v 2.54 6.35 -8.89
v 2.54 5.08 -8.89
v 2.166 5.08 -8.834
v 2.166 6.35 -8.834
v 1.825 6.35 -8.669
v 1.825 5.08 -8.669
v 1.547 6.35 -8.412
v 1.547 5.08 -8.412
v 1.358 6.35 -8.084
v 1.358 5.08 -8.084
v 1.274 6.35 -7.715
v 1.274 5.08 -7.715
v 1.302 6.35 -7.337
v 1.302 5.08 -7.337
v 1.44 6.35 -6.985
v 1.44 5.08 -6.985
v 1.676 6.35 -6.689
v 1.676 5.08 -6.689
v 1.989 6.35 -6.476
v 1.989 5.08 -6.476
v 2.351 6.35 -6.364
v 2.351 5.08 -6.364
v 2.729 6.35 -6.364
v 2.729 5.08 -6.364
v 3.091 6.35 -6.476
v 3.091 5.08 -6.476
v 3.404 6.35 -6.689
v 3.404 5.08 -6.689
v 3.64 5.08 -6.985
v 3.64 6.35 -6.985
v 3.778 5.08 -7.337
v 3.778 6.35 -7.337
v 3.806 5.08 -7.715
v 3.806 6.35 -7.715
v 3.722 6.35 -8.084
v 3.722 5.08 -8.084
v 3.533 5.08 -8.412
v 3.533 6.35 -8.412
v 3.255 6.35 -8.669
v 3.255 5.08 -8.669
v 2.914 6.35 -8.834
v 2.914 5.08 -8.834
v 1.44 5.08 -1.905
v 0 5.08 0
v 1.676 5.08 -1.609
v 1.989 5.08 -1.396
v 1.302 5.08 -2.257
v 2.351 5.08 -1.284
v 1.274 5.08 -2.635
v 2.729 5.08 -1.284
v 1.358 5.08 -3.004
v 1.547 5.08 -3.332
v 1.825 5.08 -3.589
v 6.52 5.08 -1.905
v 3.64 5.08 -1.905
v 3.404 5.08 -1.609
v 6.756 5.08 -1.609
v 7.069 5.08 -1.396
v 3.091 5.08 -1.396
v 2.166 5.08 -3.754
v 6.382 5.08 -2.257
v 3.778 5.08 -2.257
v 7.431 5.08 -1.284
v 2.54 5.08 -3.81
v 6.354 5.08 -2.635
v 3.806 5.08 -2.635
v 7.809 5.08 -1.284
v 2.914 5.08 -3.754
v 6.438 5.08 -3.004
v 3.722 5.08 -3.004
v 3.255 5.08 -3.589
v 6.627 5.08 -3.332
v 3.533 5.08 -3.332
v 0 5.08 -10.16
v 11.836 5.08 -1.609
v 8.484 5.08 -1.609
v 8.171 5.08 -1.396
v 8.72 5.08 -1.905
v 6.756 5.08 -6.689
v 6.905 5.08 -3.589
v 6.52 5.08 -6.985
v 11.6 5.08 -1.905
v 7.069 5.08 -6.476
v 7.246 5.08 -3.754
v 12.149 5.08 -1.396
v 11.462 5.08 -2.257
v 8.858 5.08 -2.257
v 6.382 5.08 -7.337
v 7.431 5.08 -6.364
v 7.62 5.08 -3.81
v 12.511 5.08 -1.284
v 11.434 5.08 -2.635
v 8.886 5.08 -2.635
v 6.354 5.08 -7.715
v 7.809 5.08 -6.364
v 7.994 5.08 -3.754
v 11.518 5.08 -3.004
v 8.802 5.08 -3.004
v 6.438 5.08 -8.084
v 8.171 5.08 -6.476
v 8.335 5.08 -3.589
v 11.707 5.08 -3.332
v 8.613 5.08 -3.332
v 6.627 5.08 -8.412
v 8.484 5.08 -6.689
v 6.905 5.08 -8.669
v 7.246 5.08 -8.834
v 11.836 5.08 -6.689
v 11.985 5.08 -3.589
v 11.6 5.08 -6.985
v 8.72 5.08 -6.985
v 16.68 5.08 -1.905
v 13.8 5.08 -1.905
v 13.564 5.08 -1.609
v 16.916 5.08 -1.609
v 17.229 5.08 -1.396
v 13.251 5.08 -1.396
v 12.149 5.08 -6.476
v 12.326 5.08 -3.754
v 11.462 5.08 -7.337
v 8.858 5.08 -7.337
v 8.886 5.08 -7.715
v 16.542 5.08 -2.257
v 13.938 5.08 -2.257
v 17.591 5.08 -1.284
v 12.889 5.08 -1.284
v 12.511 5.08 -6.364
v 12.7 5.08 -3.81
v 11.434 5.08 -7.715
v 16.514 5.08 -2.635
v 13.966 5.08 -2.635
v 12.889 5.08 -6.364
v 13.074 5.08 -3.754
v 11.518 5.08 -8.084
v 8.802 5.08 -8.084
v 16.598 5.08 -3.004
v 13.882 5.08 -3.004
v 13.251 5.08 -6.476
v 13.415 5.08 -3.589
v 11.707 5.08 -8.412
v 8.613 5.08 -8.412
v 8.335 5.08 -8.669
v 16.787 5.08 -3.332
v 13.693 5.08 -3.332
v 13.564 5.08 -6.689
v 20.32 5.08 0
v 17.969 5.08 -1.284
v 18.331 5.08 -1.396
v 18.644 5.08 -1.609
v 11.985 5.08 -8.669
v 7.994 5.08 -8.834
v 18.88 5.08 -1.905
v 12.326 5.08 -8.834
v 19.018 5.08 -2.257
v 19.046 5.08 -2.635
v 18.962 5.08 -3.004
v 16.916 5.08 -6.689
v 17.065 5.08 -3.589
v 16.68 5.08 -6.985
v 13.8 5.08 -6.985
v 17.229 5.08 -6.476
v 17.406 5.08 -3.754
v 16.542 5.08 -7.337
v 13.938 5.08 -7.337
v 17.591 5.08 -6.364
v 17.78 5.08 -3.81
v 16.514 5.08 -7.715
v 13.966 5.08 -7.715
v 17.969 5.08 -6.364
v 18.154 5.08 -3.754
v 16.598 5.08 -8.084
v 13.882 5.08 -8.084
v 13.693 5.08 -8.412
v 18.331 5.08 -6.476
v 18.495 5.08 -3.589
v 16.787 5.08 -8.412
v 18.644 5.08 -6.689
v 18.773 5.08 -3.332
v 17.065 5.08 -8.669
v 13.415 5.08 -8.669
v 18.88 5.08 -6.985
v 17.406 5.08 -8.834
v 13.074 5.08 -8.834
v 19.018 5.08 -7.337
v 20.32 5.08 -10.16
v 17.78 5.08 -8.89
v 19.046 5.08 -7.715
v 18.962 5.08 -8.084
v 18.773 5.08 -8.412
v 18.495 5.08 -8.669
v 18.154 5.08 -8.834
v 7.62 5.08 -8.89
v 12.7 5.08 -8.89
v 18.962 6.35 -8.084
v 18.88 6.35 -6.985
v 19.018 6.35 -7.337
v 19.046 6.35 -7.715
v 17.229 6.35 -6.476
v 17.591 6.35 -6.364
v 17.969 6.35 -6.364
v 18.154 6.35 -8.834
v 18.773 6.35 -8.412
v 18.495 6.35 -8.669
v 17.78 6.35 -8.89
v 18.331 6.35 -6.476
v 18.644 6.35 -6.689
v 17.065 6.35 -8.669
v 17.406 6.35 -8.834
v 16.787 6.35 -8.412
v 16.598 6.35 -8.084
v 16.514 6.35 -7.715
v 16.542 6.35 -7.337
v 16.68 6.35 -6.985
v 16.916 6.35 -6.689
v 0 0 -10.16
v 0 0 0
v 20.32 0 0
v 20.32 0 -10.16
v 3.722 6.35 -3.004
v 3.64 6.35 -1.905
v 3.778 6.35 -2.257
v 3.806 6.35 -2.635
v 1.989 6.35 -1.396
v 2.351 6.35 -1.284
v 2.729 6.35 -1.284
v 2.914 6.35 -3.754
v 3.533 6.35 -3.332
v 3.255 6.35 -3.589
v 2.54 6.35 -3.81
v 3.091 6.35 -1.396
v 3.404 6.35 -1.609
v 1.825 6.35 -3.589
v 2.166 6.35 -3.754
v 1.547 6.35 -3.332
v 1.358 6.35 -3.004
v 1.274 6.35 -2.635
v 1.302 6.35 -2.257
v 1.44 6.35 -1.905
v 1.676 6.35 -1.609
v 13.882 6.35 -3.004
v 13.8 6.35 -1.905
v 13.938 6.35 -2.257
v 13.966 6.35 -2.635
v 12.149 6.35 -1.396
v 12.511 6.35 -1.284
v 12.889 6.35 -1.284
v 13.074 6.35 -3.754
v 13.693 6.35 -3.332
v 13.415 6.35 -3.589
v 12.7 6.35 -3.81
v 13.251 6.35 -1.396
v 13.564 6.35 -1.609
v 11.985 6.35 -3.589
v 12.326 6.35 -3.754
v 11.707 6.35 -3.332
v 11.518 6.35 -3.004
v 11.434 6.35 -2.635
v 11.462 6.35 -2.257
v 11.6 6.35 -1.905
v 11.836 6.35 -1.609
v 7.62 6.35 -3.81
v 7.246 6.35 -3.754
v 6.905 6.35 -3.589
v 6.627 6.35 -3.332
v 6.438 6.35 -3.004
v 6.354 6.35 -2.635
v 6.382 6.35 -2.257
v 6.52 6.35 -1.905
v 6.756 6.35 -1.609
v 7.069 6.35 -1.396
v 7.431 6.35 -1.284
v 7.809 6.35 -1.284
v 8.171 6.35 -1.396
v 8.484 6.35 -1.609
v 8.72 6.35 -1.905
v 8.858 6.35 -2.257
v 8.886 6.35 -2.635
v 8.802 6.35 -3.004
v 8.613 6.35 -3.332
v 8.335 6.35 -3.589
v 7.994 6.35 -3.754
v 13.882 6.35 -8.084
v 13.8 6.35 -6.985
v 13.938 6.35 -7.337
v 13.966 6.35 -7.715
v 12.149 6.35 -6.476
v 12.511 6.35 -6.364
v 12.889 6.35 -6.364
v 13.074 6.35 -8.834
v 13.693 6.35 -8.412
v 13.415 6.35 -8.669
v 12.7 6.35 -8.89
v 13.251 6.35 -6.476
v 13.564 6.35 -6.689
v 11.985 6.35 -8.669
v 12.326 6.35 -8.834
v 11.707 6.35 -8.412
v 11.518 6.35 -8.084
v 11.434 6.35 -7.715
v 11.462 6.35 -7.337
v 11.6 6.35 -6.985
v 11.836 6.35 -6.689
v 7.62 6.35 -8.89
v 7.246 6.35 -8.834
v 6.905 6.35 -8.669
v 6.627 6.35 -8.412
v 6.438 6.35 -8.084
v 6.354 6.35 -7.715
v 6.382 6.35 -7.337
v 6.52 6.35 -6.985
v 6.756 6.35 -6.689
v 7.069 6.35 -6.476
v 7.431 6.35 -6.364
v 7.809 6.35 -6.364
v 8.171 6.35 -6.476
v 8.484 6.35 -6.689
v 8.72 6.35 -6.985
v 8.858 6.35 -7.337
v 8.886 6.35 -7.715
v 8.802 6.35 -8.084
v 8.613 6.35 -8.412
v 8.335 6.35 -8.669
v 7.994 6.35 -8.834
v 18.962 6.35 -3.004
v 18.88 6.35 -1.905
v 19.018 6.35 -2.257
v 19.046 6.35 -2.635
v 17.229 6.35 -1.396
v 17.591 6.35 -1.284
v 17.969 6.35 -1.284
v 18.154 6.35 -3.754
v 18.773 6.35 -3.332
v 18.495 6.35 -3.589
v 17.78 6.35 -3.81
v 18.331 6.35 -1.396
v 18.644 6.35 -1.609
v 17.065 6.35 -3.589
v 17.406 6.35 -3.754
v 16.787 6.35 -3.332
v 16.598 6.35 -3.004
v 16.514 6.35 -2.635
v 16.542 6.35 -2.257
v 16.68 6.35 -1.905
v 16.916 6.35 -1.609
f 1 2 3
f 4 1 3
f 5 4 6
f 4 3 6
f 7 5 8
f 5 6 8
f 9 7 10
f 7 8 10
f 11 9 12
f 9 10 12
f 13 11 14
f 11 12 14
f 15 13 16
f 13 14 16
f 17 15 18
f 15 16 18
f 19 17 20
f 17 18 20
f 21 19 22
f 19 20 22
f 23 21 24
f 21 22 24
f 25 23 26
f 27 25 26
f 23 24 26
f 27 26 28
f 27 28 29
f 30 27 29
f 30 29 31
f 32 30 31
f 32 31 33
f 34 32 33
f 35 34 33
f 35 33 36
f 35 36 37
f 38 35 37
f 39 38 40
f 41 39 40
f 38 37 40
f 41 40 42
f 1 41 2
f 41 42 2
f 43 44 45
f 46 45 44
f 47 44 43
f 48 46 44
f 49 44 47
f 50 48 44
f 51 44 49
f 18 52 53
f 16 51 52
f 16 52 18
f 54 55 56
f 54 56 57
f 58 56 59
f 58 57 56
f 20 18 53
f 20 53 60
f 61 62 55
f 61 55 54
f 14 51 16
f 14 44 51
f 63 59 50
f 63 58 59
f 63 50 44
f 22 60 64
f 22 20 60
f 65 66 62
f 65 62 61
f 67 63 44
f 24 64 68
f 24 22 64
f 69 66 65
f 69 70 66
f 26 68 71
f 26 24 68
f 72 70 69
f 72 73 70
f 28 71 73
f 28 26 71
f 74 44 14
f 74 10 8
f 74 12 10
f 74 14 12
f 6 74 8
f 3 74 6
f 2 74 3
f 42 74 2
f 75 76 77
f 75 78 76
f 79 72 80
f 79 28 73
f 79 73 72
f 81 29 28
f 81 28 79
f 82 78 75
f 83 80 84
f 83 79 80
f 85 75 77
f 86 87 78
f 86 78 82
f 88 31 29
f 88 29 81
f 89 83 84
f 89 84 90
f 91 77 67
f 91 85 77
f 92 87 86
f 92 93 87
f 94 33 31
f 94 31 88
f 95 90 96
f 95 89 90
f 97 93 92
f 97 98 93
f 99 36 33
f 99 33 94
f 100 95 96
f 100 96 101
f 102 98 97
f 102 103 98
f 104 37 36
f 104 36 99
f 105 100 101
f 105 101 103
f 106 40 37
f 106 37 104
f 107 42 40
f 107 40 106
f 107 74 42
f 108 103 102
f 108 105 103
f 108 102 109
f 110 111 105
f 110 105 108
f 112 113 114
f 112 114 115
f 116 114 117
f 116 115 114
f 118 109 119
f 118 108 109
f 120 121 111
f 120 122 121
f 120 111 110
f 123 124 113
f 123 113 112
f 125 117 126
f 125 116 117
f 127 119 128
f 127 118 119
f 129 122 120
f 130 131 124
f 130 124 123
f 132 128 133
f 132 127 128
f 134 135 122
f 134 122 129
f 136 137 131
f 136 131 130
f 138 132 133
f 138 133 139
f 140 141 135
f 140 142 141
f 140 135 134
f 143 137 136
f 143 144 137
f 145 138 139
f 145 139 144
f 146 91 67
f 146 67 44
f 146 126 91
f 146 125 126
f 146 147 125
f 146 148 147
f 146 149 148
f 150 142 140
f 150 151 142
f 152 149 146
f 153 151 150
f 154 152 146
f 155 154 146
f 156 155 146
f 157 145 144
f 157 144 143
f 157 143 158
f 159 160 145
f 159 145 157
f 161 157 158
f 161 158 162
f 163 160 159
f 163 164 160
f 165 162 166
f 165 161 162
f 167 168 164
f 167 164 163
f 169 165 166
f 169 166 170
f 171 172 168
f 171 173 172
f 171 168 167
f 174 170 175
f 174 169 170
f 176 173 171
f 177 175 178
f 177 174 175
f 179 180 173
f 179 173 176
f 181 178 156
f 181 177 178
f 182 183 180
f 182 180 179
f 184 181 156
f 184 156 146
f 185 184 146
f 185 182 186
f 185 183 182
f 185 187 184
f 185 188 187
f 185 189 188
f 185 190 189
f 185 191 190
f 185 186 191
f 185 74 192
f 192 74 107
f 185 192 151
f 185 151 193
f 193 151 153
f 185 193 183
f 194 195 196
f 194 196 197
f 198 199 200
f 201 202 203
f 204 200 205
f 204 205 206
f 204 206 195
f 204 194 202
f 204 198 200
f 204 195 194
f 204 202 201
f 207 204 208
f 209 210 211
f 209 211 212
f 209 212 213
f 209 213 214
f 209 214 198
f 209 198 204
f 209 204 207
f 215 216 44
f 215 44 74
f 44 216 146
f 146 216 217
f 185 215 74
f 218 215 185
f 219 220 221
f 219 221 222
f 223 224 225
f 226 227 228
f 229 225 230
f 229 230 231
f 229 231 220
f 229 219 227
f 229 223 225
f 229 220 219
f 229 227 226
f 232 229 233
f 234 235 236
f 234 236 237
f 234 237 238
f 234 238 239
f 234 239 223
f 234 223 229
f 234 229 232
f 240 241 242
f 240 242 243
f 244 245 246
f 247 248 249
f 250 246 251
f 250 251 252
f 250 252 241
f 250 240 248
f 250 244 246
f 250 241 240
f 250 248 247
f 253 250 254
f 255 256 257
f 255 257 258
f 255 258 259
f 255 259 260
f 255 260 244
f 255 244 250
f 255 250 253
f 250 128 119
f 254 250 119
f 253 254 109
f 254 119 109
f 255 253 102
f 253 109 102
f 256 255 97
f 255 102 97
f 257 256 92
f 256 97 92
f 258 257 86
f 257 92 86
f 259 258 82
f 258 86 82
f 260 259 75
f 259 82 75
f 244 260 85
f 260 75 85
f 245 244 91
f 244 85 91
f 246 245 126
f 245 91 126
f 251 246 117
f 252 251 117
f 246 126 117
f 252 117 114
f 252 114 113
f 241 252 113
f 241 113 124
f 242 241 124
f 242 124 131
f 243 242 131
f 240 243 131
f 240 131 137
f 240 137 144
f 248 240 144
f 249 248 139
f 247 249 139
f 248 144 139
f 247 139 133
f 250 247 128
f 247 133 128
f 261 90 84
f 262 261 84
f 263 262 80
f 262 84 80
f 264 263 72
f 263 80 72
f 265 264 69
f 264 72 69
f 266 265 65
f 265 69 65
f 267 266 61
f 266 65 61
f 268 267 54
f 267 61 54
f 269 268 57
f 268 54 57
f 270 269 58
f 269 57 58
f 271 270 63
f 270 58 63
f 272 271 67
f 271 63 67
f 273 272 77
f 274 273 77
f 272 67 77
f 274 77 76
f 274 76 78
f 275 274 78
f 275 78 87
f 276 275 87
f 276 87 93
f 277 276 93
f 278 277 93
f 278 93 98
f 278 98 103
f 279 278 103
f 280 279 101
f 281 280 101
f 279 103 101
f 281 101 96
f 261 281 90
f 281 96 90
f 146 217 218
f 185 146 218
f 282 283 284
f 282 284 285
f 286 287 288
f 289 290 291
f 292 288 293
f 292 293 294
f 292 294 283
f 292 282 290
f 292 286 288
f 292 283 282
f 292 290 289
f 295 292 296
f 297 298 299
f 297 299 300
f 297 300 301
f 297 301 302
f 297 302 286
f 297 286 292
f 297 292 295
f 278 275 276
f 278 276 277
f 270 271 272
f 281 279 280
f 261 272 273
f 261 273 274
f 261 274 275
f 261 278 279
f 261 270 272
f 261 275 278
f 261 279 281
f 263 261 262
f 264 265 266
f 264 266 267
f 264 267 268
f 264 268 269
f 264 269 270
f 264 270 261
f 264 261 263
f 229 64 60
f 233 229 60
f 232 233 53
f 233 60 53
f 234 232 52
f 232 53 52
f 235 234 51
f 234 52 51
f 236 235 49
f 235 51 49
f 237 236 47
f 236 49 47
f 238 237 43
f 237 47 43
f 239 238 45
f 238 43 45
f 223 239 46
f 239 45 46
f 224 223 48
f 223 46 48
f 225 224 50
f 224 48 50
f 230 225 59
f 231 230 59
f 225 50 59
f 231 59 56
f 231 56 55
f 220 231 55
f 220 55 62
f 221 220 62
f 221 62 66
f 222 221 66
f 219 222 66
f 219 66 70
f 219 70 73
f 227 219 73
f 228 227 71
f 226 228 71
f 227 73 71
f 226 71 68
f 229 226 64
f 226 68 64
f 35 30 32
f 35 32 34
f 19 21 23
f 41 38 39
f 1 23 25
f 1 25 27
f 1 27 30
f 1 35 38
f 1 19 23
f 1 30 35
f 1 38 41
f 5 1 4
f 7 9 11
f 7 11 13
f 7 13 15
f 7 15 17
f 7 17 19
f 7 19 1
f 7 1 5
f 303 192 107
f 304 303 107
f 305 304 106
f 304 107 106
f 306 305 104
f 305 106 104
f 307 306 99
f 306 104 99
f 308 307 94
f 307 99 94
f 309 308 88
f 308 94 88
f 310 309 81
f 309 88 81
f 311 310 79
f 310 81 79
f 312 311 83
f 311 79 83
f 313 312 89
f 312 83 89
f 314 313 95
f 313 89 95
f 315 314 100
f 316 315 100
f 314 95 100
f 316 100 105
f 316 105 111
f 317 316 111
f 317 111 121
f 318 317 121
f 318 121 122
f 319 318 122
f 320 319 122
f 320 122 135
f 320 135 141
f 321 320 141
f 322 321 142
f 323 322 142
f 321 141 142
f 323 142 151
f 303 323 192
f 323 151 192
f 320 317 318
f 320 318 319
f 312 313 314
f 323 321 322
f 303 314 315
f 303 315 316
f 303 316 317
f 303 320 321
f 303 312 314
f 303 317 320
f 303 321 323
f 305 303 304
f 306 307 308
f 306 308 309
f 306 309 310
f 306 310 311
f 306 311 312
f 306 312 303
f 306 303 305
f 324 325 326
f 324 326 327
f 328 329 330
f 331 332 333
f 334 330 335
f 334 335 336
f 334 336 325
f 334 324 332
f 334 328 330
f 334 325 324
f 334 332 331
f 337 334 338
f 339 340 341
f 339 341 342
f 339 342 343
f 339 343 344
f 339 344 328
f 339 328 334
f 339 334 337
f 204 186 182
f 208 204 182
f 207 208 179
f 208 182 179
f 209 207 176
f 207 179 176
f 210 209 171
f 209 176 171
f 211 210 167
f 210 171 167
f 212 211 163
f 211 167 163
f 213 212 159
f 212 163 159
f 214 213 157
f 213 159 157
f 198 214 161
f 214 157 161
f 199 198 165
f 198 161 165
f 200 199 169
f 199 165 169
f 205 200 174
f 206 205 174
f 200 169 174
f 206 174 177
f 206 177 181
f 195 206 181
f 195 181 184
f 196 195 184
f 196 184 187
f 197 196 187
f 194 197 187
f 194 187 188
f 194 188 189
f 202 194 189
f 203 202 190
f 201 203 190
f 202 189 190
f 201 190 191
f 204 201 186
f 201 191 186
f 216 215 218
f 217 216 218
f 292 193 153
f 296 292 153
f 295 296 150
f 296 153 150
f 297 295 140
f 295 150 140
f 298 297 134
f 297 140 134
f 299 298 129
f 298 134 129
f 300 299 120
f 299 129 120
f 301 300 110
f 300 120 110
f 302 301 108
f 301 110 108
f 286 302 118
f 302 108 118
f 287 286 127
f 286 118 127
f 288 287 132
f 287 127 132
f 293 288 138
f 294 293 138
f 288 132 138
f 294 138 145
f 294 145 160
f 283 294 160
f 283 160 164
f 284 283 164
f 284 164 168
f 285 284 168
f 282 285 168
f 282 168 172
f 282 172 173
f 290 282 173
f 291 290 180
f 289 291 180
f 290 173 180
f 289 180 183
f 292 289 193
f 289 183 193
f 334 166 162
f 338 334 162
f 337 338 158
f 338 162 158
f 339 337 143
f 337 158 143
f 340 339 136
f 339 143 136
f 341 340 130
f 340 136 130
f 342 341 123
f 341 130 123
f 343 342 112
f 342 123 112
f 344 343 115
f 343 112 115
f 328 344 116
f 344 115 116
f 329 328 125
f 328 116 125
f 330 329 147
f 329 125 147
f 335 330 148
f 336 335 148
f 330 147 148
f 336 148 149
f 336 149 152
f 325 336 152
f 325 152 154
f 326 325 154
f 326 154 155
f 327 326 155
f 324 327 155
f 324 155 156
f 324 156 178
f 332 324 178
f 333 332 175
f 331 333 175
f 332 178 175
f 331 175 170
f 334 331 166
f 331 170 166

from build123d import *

# Parameters (mm, degrees)
SKETCH1_W            = 20.32
SKETCH1_H            = 10.16
BOSS_EXTRUDE1_DEPTH  = 5.08
SKETCH2_R            = 1.27
BOSS_EXTRUDE2_DEPTH  = 1.27
LPATTERN1_COUNT      = 4
LPATTERN1_PITCH      = 5.08
LPATTERN1_COUNT_DIR2 = 2
LPATTERN1_PITCH_DIR2 = 5.08


with BuildPart() as part:
    # Sketch1 → Boss-Extrude1 (new body)
    with BuildSketch(Plane(origin=(0, 0, 0), x_dir=(1, 0, 0), z_dir=(0, 1, 0))):
        with Locations((10.16, 5.08)):
            Rectangle(SKETCH1_W, SKETCH1_H)
    extrude(amount=BOSS_EXTRUDE1_DEPTH)

    # Sketch2 → Boss-Extrude2 (add)
    with BuildSketch(Plane(origin=(0, 5.08, 0), x_dir=(1, 0, 0), z_dir=(0, 1, 0))):
        with Locations(Location((2.54, 2.54, 0), (0, 0, 90))):
            Circle(SKETCH2_R)
    boss_extrude2 = extrude(amount=BOSS_EXTRUDE2_DEPTH)

    # LPattern1: Boss-Extrude2 4 × 2
    with Locations(*[(i * LPATTERN1_PITCH, 0, -j * LPATTERN1_PITCH_DIR2) for i in range(LPATTERN1_COUNT) for j in range(LPATTERN1_COUNT_DIR2) if (i, j) != (0, 0)]):
        add(boss_extrude2)


solid = part.part
